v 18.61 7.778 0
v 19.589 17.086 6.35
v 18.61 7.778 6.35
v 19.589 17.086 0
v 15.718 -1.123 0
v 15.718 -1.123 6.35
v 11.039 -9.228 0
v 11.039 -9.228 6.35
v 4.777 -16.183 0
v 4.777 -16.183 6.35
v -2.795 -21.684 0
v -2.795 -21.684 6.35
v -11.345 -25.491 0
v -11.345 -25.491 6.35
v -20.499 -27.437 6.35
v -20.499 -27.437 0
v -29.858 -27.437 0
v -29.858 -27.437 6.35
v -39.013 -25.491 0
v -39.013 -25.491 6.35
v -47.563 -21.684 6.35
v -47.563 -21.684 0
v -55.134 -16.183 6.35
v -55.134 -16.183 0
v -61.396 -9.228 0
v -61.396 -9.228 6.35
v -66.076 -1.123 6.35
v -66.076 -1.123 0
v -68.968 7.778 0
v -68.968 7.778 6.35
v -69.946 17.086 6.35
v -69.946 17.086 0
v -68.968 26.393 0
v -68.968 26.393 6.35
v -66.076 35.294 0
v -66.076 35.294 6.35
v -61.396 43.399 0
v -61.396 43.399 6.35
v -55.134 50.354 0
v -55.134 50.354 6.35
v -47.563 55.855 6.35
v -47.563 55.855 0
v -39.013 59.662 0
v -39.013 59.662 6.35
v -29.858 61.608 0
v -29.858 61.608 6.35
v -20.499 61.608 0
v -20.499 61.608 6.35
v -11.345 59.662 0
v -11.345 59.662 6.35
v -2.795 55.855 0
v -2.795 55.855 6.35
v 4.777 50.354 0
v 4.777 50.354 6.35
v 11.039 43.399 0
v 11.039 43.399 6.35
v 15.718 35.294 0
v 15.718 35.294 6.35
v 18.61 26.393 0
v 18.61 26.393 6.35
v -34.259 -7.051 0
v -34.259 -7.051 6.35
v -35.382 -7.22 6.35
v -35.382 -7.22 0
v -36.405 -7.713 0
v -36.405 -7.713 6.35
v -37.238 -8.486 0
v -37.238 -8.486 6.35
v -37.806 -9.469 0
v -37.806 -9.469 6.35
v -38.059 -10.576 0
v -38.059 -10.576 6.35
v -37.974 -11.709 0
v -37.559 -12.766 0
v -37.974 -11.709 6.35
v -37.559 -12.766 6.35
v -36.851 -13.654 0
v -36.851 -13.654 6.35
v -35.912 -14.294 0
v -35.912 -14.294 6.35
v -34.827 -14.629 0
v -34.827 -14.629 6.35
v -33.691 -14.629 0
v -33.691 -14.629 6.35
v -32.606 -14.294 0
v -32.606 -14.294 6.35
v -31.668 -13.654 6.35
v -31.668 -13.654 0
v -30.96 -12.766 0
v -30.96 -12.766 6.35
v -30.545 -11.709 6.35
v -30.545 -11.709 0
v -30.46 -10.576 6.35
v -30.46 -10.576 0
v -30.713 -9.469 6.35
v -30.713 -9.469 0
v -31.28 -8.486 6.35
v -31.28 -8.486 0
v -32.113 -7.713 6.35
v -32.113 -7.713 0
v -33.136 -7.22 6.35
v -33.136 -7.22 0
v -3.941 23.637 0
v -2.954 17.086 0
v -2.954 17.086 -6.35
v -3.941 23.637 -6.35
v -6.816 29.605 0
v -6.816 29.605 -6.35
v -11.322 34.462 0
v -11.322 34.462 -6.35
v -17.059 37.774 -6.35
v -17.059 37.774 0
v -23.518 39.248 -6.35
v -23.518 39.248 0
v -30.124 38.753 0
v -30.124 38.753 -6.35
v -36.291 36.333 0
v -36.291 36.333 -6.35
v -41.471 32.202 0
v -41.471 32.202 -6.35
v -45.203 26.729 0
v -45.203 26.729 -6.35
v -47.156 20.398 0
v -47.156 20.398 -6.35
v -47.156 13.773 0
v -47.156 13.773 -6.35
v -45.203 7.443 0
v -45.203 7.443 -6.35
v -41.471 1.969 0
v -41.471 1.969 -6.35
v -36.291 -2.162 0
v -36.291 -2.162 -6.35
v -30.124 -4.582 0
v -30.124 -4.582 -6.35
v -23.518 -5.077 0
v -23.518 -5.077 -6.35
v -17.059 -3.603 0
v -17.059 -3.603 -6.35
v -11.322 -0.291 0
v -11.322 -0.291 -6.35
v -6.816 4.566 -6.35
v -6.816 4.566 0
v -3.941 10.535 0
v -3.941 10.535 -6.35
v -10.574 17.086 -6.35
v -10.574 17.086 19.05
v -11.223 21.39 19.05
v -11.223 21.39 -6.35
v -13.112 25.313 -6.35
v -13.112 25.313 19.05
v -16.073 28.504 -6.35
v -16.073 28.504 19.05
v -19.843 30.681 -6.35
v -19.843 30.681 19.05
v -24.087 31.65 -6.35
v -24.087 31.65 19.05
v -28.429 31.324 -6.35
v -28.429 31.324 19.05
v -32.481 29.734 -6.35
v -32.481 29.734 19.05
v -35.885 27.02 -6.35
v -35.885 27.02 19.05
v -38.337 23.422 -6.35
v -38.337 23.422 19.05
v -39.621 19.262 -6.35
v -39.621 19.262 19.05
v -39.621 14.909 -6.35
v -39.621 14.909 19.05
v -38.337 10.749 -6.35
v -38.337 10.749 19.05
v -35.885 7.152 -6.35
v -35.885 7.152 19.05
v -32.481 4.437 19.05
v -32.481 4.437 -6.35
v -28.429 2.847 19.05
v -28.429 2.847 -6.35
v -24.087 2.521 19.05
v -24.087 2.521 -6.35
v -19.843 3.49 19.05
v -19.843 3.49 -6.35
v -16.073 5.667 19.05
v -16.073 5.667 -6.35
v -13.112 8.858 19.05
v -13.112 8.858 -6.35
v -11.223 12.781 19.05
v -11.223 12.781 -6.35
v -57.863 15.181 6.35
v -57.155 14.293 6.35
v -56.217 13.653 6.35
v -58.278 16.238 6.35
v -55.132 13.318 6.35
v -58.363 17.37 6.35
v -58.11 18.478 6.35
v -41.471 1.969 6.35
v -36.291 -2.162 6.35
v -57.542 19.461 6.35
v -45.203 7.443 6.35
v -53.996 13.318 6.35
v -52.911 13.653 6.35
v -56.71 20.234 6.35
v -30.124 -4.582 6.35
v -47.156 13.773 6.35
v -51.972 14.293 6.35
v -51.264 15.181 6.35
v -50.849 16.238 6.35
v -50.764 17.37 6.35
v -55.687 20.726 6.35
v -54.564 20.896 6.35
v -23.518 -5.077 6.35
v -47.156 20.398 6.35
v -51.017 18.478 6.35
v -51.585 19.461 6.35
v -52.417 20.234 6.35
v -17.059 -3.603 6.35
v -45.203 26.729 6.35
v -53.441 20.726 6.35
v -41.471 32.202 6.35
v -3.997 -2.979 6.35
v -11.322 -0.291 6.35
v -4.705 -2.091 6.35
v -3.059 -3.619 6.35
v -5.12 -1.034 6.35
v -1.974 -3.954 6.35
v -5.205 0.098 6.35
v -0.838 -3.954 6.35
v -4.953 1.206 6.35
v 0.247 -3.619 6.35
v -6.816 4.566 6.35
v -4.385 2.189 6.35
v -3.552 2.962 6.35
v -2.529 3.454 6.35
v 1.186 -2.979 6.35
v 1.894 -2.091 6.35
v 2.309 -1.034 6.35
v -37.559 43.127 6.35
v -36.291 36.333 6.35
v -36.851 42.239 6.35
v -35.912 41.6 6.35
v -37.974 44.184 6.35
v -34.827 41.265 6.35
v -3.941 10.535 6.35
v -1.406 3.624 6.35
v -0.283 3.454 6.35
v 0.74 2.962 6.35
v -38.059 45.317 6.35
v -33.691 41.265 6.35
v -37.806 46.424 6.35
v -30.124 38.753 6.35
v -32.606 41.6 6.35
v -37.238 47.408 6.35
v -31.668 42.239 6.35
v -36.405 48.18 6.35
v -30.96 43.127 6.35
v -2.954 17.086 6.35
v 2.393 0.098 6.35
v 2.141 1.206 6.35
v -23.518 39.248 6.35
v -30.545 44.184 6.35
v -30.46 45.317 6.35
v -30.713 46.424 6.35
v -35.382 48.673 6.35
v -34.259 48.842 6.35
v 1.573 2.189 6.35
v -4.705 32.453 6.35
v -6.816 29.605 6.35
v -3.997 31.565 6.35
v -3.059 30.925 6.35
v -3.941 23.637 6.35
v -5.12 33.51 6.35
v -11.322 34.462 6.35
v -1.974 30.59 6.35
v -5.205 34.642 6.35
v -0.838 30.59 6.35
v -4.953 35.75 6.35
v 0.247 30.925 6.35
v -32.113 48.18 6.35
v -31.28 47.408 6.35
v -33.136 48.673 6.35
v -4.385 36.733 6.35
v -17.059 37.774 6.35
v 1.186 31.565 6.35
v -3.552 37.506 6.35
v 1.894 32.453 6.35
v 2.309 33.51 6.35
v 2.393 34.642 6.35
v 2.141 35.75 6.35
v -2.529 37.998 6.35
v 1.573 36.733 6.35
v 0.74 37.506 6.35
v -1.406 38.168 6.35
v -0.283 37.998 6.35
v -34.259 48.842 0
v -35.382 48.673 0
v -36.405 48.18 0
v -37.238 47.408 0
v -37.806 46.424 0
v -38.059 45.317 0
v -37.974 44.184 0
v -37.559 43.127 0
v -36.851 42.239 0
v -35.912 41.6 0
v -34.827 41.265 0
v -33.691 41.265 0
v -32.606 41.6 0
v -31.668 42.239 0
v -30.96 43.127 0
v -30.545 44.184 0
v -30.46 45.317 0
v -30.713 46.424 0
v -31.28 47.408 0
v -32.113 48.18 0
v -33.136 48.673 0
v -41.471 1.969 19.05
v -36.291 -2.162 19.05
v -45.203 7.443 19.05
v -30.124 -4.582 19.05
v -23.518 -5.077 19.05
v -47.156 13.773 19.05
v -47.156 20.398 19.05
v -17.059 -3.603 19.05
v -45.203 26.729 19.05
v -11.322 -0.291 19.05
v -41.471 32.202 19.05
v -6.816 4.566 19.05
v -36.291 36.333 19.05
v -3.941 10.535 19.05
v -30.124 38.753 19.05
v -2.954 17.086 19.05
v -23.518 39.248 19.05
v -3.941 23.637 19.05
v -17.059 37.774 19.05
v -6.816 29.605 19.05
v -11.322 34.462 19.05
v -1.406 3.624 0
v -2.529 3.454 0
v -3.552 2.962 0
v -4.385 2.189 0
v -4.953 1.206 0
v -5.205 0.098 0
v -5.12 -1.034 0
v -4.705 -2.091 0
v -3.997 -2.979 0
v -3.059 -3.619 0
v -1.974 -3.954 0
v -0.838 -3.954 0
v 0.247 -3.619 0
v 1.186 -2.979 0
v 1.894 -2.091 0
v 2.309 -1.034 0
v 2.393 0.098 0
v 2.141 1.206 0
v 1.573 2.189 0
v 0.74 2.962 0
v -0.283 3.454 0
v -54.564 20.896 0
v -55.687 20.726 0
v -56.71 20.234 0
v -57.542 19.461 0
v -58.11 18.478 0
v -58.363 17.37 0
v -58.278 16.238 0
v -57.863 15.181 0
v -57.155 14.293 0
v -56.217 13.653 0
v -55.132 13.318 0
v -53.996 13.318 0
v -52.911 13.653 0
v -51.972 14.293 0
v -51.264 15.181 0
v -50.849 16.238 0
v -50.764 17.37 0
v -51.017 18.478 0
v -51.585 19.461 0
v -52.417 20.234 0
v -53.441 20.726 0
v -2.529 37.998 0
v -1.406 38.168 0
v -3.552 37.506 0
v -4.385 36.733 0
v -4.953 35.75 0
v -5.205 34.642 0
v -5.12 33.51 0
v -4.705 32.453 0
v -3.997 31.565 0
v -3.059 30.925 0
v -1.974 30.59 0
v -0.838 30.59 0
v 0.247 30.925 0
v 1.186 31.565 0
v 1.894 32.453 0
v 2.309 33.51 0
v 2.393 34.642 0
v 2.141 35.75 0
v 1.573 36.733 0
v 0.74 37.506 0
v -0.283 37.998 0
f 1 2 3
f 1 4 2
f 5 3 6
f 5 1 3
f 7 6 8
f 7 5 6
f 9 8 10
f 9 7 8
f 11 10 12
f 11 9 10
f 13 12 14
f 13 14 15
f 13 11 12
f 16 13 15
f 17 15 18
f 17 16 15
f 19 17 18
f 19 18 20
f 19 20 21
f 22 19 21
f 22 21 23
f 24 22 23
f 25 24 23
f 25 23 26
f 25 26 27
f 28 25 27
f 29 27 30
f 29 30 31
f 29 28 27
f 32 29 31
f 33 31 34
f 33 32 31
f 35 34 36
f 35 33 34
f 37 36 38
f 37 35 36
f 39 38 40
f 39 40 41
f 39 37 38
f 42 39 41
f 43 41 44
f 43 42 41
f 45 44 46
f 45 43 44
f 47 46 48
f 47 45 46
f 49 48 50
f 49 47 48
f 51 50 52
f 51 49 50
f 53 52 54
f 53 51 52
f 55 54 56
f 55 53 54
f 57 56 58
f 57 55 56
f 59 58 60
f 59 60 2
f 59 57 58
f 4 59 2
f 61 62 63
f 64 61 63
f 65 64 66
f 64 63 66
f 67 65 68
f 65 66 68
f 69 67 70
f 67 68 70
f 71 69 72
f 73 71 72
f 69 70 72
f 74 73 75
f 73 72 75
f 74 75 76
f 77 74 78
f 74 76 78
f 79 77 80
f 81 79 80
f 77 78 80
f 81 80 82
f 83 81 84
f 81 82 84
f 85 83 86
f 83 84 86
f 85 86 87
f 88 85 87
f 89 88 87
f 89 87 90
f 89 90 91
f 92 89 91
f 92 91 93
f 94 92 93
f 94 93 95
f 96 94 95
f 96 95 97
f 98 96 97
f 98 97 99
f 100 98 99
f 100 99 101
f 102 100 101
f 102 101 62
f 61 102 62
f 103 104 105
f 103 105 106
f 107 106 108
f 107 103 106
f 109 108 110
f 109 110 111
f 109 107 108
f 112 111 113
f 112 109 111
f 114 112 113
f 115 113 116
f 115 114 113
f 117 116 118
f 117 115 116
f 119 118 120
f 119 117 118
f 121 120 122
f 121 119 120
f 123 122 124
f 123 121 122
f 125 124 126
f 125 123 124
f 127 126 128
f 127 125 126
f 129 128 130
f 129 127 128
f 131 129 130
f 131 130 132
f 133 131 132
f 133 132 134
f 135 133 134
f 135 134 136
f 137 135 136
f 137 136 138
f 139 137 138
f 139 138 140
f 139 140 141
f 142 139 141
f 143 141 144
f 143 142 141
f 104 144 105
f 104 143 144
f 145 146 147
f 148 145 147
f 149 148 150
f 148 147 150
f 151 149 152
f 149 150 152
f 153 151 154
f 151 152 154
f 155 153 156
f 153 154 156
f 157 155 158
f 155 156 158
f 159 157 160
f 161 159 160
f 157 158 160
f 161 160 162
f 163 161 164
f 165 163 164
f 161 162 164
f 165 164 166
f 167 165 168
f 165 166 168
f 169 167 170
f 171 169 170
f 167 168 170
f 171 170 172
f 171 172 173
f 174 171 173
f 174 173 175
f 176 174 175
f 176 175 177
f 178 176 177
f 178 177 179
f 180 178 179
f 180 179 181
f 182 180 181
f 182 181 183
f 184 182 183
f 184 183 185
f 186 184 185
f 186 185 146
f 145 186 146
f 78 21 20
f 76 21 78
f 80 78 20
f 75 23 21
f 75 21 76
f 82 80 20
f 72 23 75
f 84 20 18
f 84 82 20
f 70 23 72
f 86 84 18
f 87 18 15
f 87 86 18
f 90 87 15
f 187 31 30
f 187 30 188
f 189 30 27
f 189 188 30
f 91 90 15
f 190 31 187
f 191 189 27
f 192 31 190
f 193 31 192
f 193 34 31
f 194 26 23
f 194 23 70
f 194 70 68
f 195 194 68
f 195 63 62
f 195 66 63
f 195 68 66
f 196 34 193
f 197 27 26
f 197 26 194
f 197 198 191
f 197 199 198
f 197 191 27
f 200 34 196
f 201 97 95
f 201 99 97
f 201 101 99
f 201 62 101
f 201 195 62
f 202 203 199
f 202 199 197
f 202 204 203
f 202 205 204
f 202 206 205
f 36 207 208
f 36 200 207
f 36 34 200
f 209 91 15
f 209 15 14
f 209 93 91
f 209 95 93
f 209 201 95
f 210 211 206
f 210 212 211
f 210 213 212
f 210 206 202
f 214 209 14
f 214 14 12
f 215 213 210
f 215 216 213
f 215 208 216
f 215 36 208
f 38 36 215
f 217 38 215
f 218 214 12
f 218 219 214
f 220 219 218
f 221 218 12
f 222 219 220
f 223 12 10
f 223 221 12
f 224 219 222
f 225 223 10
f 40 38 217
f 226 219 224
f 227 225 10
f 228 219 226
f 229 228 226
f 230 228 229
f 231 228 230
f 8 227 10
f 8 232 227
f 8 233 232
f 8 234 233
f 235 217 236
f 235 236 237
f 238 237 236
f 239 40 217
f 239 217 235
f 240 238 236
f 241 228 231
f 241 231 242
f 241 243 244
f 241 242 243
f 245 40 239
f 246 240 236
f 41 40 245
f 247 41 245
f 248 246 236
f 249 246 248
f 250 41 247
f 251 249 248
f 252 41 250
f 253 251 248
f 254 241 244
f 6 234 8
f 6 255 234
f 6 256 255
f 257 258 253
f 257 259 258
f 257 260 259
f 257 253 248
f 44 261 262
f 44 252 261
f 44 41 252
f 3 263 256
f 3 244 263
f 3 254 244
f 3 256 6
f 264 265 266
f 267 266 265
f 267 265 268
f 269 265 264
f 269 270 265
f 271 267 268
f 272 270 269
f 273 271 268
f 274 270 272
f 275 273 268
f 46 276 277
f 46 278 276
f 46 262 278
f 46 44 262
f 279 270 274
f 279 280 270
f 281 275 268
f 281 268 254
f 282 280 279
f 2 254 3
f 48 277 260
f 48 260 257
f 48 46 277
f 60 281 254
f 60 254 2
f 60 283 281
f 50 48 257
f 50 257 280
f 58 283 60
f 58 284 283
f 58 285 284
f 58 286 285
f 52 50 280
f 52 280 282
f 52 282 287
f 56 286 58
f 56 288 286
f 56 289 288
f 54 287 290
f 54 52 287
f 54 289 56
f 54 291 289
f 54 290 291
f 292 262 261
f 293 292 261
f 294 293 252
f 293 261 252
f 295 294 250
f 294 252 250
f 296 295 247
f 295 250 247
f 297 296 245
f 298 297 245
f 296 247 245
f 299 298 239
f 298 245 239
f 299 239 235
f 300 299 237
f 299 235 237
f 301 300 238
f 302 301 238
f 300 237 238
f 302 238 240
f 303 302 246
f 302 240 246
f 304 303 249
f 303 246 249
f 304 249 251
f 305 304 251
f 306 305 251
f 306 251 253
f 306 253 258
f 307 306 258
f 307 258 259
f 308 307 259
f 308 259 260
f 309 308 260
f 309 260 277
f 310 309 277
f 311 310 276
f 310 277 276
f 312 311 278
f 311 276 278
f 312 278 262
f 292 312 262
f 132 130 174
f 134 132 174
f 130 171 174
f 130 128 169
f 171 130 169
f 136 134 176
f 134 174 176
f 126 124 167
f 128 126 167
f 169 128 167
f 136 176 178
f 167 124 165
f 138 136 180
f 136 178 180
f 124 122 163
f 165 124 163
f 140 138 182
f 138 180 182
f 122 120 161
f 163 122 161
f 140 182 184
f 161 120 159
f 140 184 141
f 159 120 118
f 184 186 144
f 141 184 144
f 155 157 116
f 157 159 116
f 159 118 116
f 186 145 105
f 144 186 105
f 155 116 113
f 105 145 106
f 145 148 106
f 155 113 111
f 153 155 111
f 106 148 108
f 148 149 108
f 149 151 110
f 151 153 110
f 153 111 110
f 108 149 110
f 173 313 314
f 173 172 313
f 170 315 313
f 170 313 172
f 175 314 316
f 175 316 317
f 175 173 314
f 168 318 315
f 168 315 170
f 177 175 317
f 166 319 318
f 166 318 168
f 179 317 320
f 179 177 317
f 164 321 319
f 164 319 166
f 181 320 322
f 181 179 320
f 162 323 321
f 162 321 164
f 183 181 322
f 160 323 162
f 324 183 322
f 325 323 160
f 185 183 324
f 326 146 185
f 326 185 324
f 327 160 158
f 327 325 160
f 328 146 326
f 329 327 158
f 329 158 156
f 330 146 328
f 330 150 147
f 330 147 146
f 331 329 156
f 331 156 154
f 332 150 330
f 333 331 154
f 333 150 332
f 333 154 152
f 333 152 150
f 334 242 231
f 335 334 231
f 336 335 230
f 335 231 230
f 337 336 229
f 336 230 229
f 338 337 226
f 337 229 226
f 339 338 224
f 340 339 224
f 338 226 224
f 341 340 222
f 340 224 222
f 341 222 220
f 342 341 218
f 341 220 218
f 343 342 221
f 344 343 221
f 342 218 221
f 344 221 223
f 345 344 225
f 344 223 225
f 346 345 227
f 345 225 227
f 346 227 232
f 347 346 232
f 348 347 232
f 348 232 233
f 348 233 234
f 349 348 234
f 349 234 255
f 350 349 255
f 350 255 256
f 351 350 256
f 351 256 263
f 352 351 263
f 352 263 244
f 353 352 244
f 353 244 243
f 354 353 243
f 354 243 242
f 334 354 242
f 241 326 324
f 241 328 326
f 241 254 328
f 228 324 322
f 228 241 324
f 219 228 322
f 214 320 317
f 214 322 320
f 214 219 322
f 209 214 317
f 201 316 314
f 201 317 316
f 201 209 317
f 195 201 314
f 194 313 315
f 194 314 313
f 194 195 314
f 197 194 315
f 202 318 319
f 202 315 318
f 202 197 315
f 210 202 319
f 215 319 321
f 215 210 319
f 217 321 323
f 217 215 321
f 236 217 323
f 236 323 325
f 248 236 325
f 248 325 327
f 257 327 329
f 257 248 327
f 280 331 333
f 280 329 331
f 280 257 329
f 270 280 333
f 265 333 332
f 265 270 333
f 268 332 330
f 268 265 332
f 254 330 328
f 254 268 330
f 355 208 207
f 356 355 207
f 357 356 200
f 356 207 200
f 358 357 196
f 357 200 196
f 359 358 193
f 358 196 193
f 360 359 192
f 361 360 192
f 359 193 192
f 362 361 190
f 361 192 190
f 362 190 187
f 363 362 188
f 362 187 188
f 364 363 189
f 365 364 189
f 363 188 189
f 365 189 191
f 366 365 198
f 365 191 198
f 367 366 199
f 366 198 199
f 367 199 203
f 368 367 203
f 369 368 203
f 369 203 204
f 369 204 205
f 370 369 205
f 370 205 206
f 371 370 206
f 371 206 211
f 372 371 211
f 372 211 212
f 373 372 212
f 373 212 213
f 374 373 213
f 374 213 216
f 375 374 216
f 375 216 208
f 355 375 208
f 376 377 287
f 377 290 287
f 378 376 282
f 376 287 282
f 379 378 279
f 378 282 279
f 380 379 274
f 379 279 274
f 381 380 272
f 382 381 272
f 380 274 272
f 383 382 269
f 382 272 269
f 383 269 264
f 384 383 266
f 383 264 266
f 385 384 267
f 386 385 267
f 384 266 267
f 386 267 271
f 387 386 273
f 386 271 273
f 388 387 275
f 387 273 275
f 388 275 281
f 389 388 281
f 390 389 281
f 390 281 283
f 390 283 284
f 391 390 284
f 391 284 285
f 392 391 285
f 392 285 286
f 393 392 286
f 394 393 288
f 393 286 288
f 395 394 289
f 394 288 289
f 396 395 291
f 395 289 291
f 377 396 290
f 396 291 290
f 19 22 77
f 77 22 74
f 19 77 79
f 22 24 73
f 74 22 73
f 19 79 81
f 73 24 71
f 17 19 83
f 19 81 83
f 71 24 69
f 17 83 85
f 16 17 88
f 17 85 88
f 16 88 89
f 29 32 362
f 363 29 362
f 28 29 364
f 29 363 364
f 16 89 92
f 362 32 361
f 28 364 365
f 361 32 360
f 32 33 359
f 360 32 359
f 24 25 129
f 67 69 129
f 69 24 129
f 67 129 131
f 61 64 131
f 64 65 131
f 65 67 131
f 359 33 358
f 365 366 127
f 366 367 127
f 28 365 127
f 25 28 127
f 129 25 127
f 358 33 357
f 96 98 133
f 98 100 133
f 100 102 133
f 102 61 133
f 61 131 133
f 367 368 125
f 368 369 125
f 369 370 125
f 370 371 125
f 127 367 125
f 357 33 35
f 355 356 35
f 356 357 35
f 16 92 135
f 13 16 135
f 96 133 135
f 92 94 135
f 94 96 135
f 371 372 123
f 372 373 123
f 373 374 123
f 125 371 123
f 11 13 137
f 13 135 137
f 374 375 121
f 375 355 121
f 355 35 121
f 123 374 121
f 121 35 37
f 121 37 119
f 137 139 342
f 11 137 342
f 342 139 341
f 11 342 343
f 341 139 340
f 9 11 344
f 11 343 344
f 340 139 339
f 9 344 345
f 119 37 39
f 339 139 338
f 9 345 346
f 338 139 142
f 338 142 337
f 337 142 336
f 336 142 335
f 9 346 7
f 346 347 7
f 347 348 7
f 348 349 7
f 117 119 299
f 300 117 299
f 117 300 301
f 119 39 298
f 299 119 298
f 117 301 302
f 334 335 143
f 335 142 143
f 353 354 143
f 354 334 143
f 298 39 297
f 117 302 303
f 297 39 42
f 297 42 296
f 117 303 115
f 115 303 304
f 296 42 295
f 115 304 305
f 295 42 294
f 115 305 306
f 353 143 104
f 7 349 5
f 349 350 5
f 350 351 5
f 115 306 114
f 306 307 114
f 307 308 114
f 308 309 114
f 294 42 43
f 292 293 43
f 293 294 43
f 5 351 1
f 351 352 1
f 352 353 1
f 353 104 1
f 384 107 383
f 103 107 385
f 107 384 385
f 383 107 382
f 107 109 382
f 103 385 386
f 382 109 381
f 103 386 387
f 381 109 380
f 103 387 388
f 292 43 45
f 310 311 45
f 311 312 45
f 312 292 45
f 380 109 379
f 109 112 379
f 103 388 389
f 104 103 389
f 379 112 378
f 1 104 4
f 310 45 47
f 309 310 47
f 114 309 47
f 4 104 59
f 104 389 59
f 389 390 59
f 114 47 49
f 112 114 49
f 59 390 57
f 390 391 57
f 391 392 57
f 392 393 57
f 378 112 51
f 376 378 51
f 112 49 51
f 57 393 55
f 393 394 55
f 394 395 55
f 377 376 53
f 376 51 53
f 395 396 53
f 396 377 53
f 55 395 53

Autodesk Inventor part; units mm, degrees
ref_plane "YZ Plane" through (0, 0, 0) normal (1, 0, 0) x (0, 1, 0)
ref_plane "XZ Plane" through (0, 0, 0) normal (0, 1, 0) x (-1, 0, 0)
ref_plane "XY Plane" through (0, 0, 0) normal (0, 0, 1) x (1, 0, 0)
sketch "Sketch1" plane through (0, 0, 0) normal (0, 0, 1) x (1, 0, 0)
  line L0 (-25.1788, 61.8531) -> (-25.1788, 68.2031)
  line L1 (-13.5921, 60.3277) -> (-11.9486, 66.4613)
  line L2 (-2.7951, 55.8554) -> (0.3799, 61.3547)
  line L3 (6.4766, 48.741) -> (10.9667, 53.2312)
  line L4 (13.591, 39.4694) -> (19.0902, 42.6444)
  line L5 (18.0633, 28.6723) -> (24.1969, 30.3158)
  line L6 (19.5887, 17.0856) -> (25.9387, 17.0856)
  line L7 (18.0633, 5.4989) -> (24.1969, 3.8554)
  line L8 (13.591, -5.2981) -> (19.0902, -8.4731)
  line L9 (6.4766, -14.5698) -> (10.9667, -19.0599)
  line L10 (-2.7951, -21.6842) -> (0.3799, -27.1834)
  line L11 (-13.5921, -26.1565) -> (-11.9486, -32.2901)
  line L12 (-25.1788, -27.6819) -> (-25.1788, -34.0319)
  line L13 (-36.7655, -26.1565) -> (-38.409, -32.2901)
  line L14 (-47.5626, -21.6842) -> (-50.7376, -27.1834)
  line L15 (-56.8342, -14.5698) -> (-61.3243, -19.0599)
  line L16 (-63.9486, -5.2981) -> (-69.4479, -8.4731)
  line L17 (-68.4209, 5.4989) -> (-74.5545, 3.8554)
  line L18 (-69.9463, 17.0856) -> (-76.2963, 17.0856)
  line L19 (-68.4209, 28.6723) -> (-74.5545, 30.3158)
  line L20 (-63.9486, 39.4694) -> (-69.4479, 42.6444)
  line L21 (-56.8342, 48.741) -> (-61.3243, 53.2312)
  line L22 (-47.5626, 55.8554) -> (-50.7376, 61.3547)
  line L23 (-36.7655, 60.3277) -> (-38.409, 66.4613)
  arc A0 (-38.409, 66.4613) -> (-25.1788, 68.2031) centre (-31.8994, 68.1336) ccw
  arc A1 (-25.1788, 68.2031) -> (-11.9486, 66.4613) centre (-18.4582, 68.1336) ccw
  arc A2 (-11.9486, 66.4613) -> (0.3799, 61.3547) centre (-5.475, 64.6547) ccw
  arc A3 (0.3799, 61.3547) -> (10.9667, 53.2312) centre (6.1654, 57.9342) ccw
  arc A4 (10.9667, 53.2312) -> (19.0902, 42.6444) centre (15.6697, 48.4298) ccw
  arc A5 (19.0902, 42.6444) -> (24.1969, 30.3158) centre (22.3903, 36.7894) ccw
  arc A6 (24.1969, 30.3158) -> (25.9387, 17.0856) centre (25.8692, 23.8062) ccw
  arc A7 (25.9387, 17.0856) -> (24.1969, 3.8554) centre (25.8692, 10.365) ccw
  arc A8 (24.1969, 3.8554) -> (19.0902, -8.4731) centre (22.3903, -2.6182) ccw
  arc A9 (19.0902, -8.4731) -> (10.9667, -19.0599) centre (15.6697, -14.2586) ccw
  arc A10 (10.9667, -19.0599) -> (0.3799, -27.1834) centre (6.1654, -23.7629) ccw
  arc A11 (0.3799, -27.1834) -> (-11.9486, -32.2901) centre (-5.475, -30.4835) ccw
  arc A12 (-11.9486, -32.2901) -> (-25.1788, -34.0319) centre (-18.4582, -33.9623) ccw
  arc A13 (-25.1788, -34.0319) -> (-38.409, -32.2901) centre (-31.8994, -33.9623) ccw
  arc A14 (-38.409, -32.2901) -> (-50.7376, -27.1834) centre (-44.8826, -30.4835) ccw
  arc A15 (-50.7376, -27.1834) -> (-61.3243, -19.0599) centre (-56.523, -23.7629) ccw
  arc A16 (-61.3243, -19.0599) -> (-69.4479, -8.4731) centre (-66.0273, -14.2586) ccw
  arc A17 (-69.4479, -8.4731) -> (-74.5545, 3.8554) centre (-72.7479, -2.6182) ccw
  arc A18 (-74.5545, 3.8554) -> (-76.2963, 17.0856) centre (-76.2268, 10.365) ccw
  arc A19 (-76.2963, 17.0856) -> (-74.5545, 30.3158) centre (-76.2268, 23.8062) ccw
  arc A20 (-74.5545, 30.3158) -> (-69.4479, 42.6444) centre (-72.7479, 36.7894) ccw
  arc A21 (-69.4479, 42.6444) -> (-61.3243, 53.2312) centre (-66.0273, 48.4298) ccw
  arc A22 (-61.3243, 53.2312) -> (-50.7376, 61.3547) centre (-56.523, 57.9342) ccw
  arc A23 (-50.7376, 61.3547) -> (-38.409, 66.4613) centre (-44.8826, 64.6547) ccw
  circle A24 centre (-25.1788, 17.0856) radius 44.7675
  point P0 (0, 0)
  dimension "d36" = 89.535
  dimension "d8" = 360
extrude "Extrusion1" add sketch "Sketch1" along normal blind 6.35 contours A24
sketch "Sketch2" plane through (-25.1788, 17.0856, 0) normal (0, 0, -1) x (-1, 0, 0)
  circle A0 centre (-23.7729, 17.272) radius 3.81
  circle A1 centre (0, 0) radius 44.7675 projected
  circle A2 centre (9.0804, 27.9467) radius 3.81
  circle A3 centre (29.3849, 0) radius 3.81
  circle A4 centre (9.0804, -27.9467) radius 3.81
  circle A5 centre (-23.7729, -17.272) radius 3.81
  point P0 (-25.1788, -17.0856)
  dimension "d15" = 360
  dimension "d17" = 17.272
  dimension "d19" = 0
  dimension "d20" = 7.62
hole "Hole1" at (-1.4059, 34.3576, 0) at (-1.4059, -0.1864, 0) at (-34.2592, 45.0323, 0) at (-34.2592, -10.8611, 0) at (-54.5637, 17.0856, 0) direction (0, 0, 1) diameter 7.62 end through all
sketch "Sketch3" plane through (-25.1788, 17.0856, 0) normal (0, 0, -1) x (-1, 0, 0)
  point P0 (-25.1788, -17.0856)
sketch "Sketch4" plane through (-25.1788, 17.0856, 0) normal (0, 0, -1) x (-1, 0, 0)
  point P0 (-25.1788, -17.0856)
sketch "Sketch6" plane through (-25.1788, 17.0856, 6.35) normal (0, 0, 1) x (1, 0, 0)
  circle A0 centre (0, 0) radius 14.605
  point P0 (25.1788, -17.0856)
  dimension "d48" = 29.21
sketch "Sketch7" plane through (-25.1788, 17.0856, 6.35) normal (0, 0, 1) x (1, 0, 0)
  circle A0 centre (0, 0) radius 22.225
  point P0 (25.1788, -17.0856)
  dimension "d51" = 44.45
extrude "Extrusion4" add sketch "Sketch7" along normal mid plane 25.4
extrude "Extrusion5" cut sketch "Sketch6" along normal through all both and the other way through all
properties part number "PVC motor gear"
